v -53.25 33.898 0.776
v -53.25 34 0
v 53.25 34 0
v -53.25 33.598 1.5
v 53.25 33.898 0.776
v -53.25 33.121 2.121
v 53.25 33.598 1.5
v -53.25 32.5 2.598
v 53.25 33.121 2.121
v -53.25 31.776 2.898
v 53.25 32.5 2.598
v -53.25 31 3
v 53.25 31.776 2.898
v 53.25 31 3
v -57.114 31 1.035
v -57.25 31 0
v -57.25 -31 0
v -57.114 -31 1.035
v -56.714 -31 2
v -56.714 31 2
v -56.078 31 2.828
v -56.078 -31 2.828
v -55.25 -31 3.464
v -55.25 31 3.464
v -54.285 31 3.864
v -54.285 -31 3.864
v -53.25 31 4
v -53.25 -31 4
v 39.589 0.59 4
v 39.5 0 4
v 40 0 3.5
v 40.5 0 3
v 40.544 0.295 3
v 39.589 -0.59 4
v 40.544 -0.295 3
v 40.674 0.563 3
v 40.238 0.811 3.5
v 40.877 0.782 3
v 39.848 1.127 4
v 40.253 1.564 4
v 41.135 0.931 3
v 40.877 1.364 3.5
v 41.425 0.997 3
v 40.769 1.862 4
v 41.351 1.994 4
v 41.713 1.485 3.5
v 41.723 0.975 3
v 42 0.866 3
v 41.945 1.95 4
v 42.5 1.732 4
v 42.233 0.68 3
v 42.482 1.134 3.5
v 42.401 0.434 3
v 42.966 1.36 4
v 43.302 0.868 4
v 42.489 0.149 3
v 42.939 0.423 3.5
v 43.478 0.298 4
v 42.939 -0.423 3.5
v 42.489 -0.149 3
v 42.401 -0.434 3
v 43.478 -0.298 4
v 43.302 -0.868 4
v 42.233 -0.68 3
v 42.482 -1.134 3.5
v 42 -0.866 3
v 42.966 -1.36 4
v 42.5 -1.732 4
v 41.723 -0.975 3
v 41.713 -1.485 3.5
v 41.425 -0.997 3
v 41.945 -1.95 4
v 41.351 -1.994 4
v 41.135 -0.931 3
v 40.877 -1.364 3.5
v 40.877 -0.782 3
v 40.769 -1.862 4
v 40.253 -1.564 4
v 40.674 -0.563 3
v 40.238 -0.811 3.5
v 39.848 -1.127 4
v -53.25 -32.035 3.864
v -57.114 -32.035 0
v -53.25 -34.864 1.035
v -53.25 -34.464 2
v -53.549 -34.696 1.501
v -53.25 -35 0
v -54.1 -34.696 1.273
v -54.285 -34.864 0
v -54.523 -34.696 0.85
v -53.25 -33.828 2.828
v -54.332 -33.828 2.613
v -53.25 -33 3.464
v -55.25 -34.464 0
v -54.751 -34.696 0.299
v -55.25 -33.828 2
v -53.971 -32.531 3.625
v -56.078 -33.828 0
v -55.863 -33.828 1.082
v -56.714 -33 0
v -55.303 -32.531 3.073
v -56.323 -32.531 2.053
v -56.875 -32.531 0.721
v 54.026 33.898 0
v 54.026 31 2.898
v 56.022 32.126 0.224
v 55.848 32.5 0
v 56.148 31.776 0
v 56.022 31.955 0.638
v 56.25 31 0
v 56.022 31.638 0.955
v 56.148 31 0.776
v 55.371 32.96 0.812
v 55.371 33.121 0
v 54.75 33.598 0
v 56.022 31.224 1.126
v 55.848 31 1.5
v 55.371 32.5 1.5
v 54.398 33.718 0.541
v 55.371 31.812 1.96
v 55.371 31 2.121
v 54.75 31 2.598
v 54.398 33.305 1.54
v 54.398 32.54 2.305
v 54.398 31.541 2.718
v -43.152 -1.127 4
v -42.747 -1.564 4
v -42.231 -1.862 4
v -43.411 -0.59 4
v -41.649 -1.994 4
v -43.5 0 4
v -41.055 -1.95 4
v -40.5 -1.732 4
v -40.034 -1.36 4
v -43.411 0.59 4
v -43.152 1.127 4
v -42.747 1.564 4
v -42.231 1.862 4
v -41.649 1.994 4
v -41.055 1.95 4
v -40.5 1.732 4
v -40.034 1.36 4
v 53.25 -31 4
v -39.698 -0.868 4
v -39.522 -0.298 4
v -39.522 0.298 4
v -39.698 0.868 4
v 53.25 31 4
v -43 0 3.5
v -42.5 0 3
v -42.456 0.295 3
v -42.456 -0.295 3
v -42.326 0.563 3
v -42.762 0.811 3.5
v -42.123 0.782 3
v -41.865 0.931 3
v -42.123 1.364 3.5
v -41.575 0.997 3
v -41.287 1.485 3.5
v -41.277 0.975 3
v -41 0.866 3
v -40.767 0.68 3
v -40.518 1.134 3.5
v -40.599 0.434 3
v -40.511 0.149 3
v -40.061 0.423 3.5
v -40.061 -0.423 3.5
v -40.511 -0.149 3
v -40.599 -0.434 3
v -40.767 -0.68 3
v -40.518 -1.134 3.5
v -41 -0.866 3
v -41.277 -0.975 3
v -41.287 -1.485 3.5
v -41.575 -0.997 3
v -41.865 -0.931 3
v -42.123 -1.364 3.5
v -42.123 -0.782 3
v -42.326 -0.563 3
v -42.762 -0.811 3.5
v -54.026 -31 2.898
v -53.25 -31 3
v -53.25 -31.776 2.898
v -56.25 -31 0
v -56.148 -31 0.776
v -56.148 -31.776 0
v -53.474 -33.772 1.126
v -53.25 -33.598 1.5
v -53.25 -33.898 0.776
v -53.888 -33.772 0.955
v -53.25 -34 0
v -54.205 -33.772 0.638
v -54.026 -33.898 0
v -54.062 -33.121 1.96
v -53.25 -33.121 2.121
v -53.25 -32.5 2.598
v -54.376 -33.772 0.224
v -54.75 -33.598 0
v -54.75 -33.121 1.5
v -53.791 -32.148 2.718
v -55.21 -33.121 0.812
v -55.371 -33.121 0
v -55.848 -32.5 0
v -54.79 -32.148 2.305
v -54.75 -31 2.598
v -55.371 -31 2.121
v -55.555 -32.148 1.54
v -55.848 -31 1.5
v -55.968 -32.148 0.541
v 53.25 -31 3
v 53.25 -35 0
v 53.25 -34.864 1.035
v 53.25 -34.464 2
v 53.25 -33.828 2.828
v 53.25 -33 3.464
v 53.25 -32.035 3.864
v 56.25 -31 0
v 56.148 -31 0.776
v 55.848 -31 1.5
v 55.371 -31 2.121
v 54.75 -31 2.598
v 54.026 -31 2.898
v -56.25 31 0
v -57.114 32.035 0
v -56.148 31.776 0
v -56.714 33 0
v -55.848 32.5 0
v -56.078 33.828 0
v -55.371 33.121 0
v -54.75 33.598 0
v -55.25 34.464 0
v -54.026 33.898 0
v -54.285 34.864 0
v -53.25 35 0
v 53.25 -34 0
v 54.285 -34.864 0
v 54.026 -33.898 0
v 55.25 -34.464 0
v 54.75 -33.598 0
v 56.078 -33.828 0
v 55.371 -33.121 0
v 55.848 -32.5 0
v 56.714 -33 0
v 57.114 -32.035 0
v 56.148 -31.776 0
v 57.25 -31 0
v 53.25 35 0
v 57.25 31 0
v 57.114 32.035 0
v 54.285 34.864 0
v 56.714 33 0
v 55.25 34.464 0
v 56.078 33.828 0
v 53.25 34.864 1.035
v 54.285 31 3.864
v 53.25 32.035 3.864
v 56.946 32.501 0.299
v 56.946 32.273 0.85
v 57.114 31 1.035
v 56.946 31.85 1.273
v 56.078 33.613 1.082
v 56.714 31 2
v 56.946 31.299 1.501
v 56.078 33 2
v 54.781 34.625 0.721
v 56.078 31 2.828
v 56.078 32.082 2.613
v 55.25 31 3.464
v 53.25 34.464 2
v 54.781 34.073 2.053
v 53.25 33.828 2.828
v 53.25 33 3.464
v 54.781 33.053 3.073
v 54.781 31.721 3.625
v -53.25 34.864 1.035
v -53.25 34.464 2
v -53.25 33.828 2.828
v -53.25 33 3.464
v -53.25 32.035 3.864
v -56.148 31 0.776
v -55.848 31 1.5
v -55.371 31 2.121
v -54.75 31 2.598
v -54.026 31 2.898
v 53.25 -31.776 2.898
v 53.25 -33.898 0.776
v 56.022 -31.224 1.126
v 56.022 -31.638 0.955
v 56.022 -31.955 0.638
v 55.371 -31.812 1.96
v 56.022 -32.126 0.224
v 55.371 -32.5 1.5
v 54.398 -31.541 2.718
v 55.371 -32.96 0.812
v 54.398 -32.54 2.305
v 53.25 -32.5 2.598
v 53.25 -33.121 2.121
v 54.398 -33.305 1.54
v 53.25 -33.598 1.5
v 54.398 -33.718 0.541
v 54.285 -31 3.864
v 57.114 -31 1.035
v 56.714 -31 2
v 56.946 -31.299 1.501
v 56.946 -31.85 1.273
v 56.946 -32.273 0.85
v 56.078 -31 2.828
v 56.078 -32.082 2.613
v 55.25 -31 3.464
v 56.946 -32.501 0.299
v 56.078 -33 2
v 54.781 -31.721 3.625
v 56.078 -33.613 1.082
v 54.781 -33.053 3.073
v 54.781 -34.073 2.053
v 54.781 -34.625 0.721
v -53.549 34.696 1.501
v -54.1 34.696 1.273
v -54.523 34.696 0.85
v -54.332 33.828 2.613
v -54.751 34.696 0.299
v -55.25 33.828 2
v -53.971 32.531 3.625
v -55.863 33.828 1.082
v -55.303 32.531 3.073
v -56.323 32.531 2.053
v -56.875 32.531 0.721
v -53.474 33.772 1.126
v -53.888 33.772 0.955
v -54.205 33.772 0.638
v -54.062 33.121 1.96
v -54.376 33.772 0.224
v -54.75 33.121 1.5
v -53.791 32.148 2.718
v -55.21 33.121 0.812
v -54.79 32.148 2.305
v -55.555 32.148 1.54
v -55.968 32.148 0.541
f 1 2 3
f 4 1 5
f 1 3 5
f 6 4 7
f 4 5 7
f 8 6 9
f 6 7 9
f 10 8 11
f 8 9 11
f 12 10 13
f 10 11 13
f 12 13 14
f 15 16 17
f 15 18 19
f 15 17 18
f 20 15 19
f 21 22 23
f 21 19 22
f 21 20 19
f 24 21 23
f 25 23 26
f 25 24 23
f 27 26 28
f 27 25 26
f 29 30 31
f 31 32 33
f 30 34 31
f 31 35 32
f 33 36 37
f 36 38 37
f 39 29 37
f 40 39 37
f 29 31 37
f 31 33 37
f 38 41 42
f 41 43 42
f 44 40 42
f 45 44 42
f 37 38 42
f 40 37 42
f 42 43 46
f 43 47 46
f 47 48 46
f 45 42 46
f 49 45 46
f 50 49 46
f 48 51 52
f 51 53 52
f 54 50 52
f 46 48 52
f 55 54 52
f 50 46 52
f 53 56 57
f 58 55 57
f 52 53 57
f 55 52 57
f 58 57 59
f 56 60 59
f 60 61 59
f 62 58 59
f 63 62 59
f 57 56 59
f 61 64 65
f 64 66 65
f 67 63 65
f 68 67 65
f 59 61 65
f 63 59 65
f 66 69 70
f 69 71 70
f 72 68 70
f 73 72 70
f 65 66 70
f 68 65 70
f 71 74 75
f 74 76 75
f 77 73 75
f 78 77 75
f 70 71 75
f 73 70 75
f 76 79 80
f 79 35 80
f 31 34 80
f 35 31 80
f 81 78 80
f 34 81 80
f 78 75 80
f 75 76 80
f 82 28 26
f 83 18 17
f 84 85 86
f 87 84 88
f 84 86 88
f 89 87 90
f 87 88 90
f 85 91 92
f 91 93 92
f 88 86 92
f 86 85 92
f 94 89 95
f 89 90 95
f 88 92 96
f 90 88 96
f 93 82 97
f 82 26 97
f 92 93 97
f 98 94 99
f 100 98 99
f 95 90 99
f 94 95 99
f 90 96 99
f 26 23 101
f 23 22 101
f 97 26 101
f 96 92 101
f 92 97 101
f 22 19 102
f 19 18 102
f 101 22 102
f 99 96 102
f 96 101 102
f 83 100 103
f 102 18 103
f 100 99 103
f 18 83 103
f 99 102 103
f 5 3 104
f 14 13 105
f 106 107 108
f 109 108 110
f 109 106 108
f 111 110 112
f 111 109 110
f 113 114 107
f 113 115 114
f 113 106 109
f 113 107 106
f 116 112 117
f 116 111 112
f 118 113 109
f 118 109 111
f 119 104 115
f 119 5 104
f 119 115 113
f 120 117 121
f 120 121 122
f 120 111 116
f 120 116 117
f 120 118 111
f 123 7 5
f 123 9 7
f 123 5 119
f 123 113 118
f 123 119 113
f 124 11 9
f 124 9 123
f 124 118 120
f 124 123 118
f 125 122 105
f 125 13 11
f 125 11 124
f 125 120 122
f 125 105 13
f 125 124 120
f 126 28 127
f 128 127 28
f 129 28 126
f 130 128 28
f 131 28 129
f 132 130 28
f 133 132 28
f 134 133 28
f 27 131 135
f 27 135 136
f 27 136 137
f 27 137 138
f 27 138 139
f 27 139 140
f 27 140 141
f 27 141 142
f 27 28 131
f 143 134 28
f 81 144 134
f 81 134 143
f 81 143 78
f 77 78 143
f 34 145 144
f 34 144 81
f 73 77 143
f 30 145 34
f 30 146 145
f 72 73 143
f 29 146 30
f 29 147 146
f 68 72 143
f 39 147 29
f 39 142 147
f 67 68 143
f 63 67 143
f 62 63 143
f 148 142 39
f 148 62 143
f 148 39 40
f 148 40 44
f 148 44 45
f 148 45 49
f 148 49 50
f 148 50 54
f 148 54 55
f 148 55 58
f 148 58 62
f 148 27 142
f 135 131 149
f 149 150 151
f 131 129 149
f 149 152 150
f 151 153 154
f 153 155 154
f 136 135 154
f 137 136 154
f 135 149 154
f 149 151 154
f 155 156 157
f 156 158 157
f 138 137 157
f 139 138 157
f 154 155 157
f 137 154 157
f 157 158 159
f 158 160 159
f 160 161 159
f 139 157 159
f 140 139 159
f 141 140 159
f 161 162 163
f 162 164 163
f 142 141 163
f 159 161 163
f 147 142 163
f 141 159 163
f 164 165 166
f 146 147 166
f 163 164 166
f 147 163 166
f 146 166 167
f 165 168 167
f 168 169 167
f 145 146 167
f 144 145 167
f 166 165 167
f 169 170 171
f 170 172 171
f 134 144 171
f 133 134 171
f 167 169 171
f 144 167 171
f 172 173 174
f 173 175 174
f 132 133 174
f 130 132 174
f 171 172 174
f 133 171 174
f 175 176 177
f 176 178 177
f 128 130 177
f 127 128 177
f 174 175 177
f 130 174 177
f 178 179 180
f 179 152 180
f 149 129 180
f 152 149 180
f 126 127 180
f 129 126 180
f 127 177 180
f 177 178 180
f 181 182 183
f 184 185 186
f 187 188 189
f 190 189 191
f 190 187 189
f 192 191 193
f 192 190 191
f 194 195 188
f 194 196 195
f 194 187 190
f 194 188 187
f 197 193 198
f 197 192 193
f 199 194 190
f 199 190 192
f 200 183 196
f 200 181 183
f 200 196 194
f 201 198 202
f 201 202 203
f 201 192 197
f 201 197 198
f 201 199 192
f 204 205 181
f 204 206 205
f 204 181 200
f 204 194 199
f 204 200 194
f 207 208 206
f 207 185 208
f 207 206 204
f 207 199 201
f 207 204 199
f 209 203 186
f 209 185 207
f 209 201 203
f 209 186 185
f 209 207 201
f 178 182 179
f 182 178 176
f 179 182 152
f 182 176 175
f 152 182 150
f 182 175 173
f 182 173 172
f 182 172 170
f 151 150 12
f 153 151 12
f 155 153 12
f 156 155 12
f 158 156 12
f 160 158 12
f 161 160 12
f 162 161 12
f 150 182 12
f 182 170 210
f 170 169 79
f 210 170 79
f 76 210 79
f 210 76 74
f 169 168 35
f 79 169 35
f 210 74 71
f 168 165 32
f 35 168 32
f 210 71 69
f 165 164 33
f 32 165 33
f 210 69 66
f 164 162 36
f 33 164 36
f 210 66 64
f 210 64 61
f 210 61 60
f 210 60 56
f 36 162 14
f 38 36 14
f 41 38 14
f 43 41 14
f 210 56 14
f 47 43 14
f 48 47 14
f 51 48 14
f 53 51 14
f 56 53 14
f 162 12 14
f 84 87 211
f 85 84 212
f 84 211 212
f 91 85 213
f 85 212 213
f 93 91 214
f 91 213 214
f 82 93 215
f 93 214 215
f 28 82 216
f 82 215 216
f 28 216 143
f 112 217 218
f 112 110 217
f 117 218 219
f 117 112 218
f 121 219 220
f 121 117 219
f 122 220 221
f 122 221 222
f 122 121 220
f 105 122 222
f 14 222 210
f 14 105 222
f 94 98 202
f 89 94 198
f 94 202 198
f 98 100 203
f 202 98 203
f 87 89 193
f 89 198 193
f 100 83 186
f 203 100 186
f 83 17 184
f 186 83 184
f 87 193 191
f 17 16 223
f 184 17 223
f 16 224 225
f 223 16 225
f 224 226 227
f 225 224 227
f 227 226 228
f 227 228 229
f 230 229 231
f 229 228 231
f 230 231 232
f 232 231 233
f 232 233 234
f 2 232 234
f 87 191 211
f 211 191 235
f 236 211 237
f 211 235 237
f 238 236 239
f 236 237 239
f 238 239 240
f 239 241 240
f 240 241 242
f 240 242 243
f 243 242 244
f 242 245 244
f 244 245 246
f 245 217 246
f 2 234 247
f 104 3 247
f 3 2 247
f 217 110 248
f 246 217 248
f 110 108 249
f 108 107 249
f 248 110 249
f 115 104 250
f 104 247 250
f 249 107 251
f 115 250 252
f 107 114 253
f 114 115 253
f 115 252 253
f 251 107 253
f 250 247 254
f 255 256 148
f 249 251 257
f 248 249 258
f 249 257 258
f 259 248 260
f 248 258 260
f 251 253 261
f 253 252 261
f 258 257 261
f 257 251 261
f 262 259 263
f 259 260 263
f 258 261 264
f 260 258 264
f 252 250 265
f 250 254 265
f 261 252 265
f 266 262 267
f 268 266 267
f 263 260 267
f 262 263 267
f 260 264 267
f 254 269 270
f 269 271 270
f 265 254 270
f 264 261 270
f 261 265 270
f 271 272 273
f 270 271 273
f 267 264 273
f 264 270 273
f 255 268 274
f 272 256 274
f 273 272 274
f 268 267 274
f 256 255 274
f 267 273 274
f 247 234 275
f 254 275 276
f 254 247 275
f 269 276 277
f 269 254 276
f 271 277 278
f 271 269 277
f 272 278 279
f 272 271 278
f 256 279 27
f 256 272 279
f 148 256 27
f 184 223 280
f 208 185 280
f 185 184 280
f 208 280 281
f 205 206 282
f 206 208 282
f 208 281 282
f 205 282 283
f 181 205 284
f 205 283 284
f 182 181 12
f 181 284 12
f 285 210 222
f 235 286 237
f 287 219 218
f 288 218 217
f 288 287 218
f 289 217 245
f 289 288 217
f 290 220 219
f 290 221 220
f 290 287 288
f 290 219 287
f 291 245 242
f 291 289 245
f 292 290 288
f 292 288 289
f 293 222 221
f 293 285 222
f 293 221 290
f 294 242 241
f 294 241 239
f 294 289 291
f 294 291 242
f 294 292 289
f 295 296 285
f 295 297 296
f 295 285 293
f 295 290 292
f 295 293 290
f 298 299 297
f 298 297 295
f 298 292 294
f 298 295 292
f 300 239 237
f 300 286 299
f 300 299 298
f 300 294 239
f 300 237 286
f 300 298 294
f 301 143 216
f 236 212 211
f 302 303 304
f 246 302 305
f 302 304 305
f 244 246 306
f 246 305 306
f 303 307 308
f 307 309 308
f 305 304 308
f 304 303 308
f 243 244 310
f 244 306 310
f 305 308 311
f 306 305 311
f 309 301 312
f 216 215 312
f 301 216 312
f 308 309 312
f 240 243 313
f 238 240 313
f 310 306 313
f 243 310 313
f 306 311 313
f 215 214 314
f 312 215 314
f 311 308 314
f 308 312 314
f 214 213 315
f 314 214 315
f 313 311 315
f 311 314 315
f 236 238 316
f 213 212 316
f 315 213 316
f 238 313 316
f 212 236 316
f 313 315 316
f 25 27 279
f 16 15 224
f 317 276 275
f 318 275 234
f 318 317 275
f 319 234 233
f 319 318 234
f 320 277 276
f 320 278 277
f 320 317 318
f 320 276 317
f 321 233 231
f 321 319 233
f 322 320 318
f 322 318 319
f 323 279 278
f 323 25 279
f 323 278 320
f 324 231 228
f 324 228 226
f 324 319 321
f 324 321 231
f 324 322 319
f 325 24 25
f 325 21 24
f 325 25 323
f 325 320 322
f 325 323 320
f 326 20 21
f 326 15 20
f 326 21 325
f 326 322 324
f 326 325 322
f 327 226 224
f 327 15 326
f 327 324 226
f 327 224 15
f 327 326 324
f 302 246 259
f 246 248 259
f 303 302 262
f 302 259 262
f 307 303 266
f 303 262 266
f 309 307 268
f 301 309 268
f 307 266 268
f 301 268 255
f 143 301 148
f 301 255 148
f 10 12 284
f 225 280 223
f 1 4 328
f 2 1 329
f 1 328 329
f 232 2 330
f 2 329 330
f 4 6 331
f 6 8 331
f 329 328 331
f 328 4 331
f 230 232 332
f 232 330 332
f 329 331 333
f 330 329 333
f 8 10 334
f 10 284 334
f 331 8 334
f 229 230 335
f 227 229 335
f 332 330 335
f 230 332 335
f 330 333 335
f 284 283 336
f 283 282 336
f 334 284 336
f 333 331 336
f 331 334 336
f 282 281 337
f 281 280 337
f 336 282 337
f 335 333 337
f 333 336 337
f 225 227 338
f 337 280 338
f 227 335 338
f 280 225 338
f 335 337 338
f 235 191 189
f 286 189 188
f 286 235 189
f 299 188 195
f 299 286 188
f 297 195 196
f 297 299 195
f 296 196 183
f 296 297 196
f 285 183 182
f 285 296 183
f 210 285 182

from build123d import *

# Parameters (mm, degrees)
F0_W           = 114.5
F0_H           = 70
F1_DEPTH       = 4
F2_R           = 3.99999
F3_T           = -1
F5_D           = 2
F5_CSINK_D     = 4
F5_CSINK_ANGLE = 90


# Not quite as in the source:
# - a fillet or chamfer is up to 0.001 mm smaller than in the source, because OpenCascade refuses the exact size


with BuildPart() as f1:
    # F0 (on Top) → F1 (new body)
    with BuildSketch(Plane.XY):
        Rectangle(F0_W, F0_H)
    extrude(amount=F1_DEPTH)

    # F2 (radius 4 in the source; OpenCascade refuses exactly that, so slightly less here)
    f2_edges = [f1.edges().sort_by_distance(p)[0] for p in [
        (-57.25, 0, 4),
        (0, 35, 4),
        (0, -35, 4),
        (-57.25, -35, 2),
        (-57.25, 35, 2),
        (57.25, 35, 2),
        (57.25, 0, 4),
        (57.25, -35, 2),
    ]]
    fillet(f2_edges, radius=F2_R)

    # F3
    f3_openings = [f1.faces().sort_by_distance(p)[0] for p in [
        (0, 0, 0),
    ]]
    offset(amount=F3_T, openings=f3_openings)

    # F5 (through all)
    with Locations(Plane.XY.offset(4)):
        with Locations((41.5, 0), (-41.5, 0)):
            CounterSinkHole(F5_D / 2, F5_CSINK_D / 2, counter_sink_angle=F5_CSINK_ANGLE)


solid = f1.part
